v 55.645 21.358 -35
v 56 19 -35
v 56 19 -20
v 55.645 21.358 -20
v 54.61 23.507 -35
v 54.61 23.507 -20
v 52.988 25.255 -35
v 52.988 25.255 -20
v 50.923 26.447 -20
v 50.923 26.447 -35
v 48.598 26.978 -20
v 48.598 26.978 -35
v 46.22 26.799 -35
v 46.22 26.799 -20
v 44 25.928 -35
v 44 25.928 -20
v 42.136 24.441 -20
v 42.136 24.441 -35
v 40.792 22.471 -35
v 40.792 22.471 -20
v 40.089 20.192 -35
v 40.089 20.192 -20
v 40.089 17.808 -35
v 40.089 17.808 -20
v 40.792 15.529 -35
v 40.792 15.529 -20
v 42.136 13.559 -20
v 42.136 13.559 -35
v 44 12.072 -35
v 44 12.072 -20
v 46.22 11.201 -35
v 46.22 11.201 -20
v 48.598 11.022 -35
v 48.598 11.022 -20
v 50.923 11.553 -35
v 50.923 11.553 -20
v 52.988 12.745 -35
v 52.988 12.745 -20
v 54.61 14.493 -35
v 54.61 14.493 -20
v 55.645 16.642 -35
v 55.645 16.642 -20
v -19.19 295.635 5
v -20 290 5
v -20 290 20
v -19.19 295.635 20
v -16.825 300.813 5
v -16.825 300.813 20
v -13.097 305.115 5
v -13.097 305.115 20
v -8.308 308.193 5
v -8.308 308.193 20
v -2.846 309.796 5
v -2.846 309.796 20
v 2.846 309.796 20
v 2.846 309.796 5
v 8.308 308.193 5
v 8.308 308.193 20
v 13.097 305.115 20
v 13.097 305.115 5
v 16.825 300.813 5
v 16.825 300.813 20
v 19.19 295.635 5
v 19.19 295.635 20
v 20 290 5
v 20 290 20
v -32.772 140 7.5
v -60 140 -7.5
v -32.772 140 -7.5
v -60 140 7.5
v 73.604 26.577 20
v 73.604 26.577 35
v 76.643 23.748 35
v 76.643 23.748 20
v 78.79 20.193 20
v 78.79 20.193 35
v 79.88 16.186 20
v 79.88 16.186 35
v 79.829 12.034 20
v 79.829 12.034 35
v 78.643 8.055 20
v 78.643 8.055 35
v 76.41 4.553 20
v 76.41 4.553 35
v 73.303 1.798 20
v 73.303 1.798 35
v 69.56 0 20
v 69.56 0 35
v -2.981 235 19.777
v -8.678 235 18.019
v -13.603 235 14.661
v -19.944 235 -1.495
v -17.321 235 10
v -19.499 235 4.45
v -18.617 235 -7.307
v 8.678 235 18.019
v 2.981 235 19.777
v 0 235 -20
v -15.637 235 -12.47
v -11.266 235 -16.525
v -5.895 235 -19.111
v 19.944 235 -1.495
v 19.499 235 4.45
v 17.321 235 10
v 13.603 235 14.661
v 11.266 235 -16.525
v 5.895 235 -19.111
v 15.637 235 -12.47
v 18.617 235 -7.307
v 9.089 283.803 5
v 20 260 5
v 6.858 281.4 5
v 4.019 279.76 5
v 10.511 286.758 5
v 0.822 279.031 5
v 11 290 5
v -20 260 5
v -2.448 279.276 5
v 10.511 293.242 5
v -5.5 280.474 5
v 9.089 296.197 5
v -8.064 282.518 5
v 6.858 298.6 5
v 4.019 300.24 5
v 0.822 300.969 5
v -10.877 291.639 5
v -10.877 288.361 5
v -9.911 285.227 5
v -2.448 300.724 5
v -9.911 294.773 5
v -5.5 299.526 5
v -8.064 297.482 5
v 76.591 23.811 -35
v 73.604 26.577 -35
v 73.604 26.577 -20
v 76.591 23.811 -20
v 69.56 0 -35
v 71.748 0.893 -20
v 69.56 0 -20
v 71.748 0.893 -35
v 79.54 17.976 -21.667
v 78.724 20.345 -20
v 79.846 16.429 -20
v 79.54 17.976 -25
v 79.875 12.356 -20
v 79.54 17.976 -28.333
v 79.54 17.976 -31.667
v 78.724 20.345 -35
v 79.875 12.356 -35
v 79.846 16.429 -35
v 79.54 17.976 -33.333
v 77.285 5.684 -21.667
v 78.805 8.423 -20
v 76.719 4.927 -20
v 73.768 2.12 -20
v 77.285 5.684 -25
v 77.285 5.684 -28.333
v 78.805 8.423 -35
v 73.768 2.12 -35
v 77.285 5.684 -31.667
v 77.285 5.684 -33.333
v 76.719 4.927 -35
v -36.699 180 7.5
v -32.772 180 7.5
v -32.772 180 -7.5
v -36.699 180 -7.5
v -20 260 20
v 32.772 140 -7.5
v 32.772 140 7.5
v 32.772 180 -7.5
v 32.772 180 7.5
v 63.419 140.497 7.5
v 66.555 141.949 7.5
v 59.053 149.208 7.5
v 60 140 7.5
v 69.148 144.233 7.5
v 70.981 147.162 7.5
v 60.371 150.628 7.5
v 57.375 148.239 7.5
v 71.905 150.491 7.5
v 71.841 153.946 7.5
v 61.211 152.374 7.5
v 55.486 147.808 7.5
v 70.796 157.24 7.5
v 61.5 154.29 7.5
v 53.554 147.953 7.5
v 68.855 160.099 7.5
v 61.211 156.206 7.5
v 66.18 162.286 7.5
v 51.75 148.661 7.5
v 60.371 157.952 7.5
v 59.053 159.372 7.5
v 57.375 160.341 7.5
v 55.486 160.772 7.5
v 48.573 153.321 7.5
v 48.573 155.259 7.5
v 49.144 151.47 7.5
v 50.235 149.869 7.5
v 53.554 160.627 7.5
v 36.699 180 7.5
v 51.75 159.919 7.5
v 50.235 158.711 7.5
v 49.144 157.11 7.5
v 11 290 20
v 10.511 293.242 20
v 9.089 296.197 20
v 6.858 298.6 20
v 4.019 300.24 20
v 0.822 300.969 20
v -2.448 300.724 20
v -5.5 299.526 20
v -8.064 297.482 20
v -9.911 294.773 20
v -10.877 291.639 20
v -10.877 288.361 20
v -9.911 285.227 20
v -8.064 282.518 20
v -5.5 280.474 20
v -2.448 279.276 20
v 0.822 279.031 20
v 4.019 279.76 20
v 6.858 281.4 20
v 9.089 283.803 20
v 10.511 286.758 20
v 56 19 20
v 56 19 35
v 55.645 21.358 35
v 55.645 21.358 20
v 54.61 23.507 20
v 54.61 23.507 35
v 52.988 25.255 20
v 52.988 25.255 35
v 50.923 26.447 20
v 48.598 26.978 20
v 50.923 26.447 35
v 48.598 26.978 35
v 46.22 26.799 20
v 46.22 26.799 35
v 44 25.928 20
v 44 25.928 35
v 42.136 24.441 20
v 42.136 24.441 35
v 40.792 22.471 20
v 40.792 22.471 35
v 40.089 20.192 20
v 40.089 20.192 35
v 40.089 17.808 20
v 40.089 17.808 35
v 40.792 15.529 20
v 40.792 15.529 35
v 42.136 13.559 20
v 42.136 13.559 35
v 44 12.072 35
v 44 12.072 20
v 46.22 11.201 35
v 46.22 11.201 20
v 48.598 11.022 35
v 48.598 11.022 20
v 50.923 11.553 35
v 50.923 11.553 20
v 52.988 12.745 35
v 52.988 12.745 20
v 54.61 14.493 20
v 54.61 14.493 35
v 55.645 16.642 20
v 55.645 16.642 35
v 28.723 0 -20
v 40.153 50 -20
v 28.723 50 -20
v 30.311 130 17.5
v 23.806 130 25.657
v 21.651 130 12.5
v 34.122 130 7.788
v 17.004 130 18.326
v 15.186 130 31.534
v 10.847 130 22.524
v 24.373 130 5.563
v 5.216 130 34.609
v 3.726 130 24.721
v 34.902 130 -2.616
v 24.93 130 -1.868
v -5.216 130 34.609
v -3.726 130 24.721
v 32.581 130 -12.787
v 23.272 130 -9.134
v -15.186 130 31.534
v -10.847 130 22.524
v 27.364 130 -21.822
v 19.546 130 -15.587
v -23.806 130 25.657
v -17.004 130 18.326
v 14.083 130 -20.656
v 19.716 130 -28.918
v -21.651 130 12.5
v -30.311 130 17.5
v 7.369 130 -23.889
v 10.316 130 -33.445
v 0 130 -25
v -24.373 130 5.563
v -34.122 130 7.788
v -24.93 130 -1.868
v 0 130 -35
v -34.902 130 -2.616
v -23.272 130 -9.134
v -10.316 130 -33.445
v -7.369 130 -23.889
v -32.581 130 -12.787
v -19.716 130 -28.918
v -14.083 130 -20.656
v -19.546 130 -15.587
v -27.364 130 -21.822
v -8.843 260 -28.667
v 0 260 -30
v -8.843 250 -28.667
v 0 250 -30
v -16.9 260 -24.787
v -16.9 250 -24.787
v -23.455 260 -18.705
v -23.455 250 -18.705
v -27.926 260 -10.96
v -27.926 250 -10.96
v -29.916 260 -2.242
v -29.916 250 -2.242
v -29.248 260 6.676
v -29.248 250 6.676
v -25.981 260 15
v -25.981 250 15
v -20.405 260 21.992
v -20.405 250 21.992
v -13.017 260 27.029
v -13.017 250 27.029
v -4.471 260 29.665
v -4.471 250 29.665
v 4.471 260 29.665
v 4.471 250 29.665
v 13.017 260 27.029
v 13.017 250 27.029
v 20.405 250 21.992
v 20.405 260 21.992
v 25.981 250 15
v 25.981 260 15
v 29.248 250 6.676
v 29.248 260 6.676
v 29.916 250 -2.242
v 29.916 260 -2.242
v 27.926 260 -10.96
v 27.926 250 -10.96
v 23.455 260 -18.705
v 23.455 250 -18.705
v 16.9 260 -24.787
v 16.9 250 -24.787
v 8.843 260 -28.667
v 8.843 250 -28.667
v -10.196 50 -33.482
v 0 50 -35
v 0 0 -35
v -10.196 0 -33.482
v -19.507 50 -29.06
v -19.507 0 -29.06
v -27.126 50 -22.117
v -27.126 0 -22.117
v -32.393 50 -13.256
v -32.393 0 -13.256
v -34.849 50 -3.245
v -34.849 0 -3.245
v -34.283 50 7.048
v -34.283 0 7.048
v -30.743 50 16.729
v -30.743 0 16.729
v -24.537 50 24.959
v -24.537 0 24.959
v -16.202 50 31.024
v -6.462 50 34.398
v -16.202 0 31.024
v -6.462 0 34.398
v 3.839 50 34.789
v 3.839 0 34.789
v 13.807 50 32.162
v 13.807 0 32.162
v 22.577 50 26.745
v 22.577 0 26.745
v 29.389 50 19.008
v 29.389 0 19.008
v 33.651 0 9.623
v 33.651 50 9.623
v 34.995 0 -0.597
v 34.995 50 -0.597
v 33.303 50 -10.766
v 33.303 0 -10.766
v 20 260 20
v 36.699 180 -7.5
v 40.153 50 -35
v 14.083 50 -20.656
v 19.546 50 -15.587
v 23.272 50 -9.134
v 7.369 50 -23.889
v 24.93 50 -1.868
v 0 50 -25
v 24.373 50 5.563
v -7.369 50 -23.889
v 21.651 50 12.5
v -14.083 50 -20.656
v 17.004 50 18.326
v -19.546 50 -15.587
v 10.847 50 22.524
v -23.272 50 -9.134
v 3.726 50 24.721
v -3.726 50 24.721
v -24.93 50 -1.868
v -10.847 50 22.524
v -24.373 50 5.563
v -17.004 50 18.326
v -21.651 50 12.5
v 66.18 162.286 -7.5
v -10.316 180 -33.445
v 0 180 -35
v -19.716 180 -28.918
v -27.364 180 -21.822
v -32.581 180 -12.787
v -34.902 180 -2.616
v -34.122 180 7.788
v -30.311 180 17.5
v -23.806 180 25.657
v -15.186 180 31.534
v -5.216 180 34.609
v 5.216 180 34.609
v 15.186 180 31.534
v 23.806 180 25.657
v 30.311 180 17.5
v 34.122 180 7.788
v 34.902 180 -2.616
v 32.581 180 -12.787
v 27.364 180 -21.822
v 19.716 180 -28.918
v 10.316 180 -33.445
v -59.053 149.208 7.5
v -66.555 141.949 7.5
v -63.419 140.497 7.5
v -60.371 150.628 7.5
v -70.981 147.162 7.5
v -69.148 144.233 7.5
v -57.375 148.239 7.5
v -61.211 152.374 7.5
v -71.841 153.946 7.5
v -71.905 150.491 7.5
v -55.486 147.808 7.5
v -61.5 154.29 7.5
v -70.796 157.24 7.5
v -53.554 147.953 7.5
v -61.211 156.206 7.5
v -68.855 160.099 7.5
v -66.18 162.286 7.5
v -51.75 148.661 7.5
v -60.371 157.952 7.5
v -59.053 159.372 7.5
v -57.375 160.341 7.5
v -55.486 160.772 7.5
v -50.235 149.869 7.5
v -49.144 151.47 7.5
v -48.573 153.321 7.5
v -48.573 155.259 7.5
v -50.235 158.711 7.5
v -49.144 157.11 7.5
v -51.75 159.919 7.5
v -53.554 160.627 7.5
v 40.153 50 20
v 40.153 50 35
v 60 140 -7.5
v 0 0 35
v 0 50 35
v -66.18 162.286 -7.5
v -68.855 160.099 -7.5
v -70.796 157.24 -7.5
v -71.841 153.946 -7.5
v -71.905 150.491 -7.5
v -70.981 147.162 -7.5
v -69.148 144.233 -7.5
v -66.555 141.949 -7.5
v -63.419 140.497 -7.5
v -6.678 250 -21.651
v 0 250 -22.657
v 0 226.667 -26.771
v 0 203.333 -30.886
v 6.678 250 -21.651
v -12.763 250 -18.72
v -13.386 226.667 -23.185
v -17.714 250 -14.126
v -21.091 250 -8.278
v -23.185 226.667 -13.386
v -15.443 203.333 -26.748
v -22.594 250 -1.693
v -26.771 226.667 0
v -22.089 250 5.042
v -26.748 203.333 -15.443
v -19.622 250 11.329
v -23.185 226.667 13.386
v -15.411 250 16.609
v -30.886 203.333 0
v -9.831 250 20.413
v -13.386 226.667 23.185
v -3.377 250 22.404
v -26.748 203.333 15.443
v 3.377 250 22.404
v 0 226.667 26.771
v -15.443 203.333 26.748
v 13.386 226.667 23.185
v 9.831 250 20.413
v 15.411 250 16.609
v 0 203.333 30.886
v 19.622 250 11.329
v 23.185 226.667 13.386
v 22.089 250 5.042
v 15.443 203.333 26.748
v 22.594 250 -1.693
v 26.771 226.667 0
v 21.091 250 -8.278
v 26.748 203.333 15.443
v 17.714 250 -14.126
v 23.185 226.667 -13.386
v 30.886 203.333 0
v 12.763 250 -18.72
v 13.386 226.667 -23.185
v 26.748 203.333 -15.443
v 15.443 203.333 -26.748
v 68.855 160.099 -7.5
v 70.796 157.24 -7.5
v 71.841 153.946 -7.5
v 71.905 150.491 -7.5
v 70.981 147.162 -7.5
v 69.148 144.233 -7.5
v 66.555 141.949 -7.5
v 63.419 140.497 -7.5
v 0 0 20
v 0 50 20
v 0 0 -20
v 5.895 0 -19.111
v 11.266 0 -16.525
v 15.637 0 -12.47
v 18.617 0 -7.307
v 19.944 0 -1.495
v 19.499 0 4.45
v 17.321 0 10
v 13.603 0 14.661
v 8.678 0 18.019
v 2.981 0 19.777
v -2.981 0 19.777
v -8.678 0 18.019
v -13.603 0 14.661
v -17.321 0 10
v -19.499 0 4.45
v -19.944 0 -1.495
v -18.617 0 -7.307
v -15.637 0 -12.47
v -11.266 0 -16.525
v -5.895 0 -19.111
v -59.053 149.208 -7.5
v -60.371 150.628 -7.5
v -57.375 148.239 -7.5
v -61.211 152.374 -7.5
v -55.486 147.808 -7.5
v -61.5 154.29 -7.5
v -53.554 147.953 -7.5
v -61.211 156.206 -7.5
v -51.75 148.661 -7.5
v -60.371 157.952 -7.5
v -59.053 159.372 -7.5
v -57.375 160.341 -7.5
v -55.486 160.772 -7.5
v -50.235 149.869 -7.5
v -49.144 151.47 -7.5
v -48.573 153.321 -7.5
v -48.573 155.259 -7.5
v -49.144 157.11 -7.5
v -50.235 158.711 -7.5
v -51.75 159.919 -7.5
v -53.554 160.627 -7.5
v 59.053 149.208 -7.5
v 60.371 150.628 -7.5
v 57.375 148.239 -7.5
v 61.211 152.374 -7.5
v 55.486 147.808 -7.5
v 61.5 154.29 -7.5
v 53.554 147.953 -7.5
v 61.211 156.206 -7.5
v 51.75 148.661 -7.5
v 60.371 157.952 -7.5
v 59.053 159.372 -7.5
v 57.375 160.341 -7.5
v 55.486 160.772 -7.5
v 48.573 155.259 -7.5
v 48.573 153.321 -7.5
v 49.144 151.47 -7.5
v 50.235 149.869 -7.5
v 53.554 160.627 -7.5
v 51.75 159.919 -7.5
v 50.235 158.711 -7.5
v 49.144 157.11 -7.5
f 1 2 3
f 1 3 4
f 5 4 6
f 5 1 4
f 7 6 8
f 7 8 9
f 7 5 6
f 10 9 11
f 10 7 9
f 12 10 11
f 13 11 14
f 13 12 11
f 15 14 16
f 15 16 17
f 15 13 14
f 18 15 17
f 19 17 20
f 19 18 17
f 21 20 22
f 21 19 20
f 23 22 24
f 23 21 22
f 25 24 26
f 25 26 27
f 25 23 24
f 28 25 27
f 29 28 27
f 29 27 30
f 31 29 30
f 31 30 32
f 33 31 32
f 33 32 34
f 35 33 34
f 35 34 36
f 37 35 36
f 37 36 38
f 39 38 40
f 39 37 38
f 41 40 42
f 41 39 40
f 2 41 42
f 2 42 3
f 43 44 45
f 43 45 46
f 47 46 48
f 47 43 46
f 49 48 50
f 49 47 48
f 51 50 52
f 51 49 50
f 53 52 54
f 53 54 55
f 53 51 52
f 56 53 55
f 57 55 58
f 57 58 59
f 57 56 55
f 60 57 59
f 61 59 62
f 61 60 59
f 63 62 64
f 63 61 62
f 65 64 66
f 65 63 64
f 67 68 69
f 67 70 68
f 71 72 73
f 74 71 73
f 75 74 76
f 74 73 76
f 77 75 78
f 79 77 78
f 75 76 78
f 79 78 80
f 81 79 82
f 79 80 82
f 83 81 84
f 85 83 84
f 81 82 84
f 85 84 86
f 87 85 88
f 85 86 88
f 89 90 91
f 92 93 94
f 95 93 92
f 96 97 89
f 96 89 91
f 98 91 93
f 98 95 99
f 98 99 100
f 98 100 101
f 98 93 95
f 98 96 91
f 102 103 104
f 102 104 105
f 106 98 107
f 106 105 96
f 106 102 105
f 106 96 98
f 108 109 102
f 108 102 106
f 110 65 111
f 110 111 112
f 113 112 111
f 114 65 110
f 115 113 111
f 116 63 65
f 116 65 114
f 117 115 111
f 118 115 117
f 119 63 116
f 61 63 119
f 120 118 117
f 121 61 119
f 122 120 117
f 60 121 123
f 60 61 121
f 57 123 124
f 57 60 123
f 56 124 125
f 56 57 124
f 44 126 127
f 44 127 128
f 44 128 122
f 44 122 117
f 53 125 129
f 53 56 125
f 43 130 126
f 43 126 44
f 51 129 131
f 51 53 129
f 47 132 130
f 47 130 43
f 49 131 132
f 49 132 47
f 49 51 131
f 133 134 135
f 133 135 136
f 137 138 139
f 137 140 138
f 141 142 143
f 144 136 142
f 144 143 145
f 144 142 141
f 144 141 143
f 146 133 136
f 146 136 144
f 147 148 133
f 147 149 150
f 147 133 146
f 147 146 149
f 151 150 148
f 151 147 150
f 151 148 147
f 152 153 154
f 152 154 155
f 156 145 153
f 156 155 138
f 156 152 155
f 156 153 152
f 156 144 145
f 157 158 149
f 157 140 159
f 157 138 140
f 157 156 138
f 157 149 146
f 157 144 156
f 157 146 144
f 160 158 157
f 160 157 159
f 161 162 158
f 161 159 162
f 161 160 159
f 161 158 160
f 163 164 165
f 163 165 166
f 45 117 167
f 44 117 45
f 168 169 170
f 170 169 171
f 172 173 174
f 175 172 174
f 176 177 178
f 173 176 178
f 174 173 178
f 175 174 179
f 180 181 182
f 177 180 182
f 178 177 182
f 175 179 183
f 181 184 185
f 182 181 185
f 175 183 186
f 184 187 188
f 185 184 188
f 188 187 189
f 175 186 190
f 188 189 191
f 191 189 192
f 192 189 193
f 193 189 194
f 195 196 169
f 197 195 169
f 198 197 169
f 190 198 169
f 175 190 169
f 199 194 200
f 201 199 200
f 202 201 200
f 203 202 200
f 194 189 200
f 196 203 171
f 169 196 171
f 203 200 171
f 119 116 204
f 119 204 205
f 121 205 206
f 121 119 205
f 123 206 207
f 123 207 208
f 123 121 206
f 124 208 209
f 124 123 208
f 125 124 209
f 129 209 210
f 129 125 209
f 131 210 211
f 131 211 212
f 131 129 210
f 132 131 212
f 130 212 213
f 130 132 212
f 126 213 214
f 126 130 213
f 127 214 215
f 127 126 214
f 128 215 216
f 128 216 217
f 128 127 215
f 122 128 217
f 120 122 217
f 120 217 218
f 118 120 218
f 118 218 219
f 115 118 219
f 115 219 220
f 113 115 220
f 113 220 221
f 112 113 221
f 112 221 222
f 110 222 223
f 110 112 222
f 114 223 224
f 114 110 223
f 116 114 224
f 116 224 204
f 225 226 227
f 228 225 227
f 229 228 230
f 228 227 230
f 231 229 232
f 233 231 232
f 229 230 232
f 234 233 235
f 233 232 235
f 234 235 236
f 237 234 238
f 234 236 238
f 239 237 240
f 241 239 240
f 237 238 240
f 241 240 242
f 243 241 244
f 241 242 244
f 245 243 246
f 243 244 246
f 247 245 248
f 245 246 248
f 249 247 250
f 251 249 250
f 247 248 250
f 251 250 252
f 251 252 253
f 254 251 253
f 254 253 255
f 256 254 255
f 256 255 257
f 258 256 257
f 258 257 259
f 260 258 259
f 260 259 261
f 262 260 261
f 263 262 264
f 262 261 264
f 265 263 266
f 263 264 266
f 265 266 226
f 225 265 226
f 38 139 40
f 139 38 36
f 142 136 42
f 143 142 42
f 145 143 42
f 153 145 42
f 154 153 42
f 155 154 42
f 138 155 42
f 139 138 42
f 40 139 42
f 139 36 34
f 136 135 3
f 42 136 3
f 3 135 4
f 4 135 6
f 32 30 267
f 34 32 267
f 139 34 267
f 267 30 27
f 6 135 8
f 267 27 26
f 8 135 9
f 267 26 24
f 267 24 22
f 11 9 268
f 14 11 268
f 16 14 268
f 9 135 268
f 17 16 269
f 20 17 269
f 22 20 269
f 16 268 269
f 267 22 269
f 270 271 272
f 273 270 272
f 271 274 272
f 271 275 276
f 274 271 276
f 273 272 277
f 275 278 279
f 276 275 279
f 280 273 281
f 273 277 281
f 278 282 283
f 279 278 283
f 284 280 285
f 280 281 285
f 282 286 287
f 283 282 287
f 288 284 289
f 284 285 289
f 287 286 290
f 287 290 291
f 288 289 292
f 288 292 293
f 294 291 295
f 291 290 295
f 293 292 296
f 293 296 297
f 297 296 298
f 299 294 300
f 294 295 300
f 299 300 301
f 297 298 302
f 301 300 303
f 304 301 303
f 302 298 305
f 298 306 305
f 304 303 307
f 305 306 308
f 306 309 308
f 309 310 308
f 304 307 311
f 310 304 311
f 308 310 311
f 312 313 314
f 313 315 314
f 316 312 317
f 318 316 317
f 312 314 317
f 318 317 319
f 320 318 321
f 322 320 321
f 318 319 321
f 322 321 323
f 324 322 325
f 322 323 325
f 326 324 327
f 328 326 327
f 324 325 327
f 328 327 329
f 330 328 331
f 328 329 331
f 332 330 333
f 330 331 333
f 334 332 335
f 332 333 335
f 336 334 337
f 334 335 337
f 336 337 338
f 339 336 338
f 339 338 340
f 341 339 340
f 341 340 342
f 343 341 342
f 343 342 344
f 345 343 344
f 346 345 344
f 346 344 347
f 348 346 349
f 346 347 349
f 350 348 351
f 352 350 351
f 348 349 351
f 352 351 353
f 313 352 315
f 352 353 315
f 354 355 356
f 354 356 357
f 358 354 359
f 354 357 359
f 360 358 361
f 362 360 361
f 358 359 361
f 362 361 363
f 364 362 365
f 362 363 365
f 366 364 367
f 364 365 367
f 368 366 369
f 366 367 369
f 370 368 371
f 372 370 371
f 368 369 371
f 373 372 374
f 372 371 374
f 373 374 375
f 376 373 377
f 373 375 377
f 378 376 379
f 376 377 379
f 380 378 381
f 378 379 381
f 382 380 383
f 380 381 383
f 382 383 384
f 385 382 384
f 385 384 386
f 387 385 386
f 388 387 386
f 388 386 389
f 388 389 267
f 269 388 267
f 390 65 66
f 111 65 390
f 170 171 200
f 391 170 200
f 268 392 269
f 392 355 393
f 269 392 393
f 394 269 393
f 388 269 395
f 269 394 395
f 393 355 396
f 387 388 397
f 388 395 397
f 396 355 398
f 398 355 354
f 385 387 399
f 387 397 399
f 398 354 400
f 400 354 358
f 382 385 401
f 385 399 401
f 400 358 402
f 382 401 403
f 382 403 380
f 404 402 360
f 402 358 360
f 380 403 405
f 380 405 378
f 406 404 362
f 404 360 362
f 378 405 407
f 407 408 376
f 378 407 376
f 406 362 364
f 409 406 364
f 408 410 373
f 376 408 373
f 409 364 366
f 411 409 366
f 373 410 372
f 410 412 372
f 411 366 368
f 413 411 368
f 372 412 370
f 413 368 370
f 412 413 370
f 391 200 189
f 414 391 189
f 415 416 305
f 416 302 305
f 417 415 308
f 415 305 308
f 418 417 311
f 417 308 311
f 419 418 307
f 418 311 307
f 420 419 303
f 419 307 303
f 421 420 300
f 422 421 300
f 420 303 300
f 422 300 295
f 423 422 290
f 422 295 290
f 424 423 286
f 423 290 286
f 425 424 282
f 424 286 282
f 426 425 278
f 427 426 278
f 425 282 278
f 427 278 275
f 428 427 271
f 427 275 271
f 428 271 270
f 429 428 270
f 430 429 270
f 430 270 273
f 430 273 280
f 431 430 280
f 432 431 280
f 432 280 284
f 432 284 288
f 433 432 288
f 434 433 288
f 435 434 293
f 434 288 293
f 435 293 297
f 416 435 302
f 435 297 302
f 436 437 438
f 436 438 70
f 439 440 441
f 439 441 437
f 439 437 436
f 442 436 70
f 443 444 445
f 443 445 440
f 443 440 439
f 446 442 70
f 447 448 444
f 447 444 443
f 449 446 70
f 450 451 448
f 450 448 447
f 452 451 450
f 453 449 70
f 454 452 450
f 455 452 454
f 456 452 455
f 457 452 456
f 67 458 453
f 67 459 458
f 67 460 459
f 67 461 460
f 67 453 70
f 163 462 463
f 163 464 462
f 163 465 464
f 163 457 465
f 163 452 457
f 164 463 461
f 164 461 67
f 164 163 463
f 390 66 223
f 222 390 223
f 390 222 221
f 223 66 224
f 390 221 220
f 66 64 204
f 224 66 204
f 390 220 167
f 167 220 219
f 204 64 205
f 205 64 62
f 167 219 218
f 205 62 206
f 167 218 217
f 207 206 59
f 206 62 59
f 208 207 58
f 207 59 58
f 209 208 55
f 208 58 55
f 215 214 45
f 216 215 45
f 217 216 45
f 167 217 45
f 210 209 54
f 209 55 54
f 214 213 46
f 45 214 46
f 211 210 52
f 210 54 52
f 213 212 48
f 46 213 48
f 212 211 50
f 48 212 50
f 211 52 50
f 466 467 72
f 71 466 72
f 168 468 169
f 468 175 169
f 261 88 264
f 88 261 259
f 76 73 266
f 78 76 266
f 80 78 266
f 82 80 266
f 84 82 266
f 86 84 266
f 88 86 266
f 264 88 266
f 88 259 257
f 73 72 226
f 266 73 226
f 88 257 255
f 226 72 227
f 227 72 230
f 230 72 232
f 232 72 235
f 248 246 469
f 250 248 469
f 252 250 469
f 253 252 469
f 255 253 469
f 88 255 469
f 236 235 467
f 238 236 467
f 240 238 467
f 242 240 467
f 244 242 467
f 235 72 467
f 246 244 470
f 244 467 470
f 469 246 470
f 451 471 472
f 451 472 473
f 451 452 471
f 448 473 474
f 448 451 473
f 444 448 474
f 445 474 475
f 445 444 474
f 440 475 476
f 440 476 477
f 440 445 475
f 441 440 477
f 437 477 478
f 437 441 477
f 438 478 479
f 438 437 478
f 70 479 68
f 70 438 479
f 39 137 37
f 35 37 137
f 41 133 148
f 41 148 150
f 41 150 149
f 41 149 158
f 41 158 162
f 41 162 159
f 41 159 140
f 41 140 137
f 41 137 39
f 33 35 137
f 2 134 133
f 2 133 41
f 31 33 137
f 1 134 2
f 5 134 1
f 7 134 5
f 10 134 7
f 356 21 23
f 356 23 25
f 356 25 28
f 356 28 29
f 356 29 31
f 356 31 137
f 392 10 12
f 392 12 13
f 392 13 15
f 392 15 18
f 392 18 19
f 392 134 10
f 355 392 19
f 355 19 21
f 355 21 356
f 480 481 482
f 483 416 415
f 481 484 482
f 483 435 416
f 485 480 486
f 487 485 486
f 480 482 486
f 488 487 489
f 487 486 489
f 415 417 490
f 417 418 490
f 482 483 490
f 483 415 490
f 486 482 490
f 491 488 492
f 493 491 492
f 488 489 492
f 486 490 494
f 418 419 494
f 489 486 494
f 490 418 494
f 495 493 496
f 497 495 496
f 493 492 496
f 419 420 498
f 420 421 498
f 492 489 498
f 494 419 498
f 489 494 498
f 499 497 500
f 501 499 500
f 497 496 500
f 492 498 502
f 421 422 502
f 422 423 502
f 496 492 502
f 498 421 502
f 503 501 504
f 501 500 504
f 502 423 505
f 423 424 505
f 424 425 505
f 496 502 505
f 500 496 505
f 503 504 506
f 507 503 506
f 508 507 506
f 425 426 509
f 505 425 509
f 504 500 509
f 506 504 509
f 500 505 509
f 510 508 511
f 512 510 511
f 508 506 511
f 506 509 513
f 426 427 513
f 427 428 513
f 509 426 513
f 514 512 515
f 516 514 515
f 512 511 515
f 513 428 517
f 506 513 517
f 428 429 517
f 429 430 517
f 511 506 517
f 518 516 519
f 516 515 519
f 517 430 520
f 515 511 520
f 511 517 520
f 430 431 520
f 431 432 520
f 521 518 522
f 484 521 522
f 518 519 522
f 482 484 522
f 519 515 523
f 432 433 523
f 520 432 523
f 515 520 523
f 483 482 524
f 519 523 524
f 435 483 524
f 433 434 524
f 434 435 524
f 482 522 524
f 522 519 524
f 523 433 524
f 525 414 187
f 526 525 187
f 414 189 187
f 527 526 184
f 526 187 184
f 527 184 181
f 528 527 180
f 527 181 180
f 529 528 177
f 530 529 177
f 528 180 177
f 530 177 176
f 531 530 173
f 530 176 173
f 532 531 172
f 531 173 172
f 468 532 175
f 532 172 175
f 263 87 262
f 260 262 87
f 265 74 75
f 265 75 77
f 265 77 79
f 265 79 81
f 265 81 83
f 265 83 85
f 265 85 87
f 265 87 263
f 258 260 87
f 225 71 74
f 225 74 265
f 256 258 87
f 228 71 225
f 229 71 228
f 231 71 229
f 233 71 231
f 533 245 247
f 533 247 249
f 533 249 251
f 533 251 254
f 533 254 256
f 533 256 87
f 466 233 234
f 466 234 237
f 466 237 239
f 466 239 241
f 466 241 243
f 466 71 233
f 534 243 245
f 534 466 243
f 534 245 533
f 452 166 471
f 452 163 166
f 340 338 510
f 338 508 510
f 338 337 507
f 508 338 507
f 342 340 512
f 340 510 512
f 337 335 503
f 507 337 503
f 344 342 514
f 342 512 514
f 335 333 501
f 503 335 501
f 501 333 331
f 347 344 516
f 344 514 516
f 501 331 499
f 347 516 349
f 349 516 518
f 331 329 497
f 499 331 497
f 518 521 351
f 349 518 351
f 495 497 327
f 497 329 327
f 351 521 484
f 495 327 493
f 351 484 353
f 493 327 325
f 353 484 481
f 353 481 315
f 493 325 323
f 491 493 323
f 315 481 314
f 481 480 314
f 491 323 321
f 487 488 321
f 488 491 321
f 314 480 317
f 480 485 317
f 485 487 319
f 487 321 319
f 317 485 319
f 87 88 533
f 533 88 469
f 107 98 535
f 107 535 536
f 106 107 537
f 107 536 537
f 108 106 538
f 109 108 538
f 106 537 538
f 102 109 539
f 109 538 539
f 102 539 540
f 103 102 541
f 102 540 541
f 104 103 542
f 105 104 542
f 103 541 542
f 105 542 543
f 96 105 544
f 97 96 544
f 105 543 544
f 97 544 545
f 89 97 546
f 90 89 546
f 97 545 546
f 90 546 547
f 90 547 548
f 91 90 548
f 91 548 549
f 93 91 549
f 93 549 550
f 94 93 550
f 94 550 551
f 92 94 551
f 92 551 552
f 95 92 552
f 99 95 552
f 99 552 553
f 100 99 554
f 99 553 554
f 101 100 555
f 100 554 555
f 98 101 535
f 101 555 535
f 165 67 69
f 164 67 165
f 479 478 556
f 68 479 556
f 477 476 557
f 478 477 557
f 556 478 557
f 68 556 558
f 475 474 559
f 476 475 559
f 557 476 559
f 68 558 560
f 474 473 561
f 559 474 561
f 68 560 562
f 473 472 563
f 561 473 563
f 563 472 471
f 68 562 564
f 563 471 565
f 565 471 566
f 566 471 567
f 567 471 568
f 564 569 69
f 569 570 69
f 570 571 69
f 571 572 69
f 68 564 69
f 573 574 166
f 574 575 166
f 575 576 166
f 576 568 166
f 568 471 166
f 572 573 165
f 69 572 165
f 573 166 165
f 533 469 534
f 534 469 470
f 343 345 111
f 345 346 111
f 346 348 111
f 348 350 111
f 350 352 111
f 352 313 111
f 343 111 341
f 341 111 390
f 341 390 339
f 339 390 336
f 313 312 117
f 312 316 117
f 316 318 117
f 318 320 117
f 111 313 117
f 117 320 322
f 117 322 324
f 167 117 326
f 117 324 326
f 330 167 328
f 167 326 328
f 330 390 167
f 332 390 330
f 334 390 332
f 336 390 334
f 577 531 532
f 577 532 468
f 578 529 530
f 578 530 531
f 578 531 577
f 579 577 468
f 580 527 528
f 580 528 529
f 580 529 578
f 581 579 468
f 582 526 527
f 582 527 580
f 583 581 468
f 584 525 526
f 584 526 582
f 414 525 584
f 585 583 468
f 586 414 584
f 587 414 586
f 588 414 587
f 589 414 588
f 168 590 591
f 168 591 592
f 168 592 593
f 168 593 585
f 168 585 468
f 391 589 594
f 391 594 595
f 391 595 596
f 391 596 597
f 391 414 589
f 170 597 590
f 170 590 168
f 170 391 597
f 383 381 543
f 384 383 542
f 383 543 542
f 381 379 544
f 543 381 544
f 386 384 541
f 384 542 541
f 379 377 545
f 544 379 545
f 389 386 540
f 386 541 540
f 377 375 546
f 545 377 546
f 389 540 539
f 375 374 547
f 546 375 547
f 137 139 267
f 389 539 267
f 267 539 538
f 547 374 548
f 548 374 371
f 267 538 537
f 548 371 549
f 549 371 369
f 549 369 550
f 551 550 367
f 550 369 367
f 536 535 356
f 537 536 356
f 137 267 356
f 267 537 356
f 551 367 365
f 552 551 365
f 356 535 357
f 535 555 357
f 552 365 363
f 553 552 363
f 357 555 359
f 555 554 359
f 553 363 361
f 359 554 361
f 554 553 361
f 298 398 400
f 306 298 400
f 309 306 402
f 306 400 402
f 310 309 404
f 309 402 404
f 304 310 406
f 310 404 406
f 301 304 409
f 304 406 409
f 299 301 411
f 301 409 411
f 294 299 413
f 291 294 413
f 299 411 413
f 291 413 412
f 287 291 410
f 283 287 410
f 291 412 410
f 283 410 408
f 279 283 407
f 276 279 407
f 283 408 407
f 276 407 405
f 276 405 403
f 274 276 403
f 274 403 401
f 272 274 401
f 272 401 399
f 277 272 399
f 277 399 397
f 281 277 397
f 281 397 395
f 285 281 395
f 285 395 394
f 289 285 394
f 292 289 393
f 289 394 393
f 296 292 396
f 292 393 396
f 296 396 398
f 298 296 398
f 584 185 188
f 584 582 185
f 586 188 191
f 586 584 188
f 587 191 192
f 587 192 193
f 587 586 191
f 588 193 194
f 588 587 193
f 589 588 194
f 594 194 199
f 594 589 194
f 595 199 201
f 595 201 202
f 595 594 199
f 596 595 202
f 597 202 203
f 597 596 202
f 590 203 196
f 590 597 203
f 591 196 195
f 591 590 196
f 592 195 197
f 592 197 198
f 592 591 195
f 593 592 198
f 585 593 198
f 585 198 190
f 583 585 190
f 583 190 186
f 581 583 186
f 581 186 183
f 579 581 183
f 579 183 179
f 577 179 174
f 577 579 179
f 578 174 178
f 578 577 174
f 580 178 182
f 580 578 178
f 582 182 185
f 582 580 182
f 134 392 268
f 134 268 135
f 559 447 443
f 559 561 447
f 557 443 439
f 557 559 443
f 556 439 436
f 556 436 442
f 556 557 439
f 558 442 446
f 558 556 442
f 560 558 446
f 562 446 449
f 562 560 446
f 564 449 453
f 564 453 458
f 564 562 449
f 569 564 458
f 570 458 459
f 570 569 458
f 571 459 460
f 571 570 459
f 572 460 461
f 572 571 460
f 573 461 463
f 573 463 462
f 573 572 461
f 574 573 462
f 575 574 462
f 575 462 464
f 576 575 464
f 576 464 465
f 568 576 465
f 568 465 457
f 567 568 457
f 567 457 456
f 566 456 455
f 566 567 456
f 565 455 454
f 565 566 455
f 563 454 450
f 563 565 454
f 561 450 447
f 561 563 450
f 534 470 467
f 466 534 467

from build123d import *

# Parameters (mm, degrees)
SKETCH4_R             = 11
BOSS_EXTRUDE2_DEPTH   = 15
SKETCH5_R             = 6.5
BOSS_EXTRUDE3_DEPTH   = 7.5
BOSS_EXTRUDE3_2_DEPTH = 7.5
SKETCH8_R             = 8
BOSS_EXTRUDE4_DEPTH   = 15
SKETCH10_R            = 8
BOSS_EXTRUDE5_DEPTH   = 15
SKETCH11_R            = 20
CUT_EXTRUDE1_DEPTH    = 235


with BuildPart() as part:
    # Sketch3 → Revolve1 (revolve)
    with BuildSketch(Plane.XY, mode=Mode.PRIVATE) as revolve1_sk:
        Polygon((0, 260), (30, 260), (30, 250), (22.65711135, 250), (35, 180), (35, 130), (25, 130), (25, 50), (35, 50), (35, 0), (0, 0), align=None)
    revolve(revolve1_sk.sketch.rotate(Axis((0, 0, 0), (0, 1, 0)), 90), axis=Axis((0, 0, 0), (0, 1, 0)))

    # Sketch4 → Boss-Extrude2 (add)
    with BuildSketch(Plane.XY.offset(5)):
        with BuildLine():
            Line((-20, 260), (-20, 290))
            ThreePointArc((-20, 290), (0, 310), (20, 290))
            Line((20, 290), (20, 260))
            Line((20, 260), (-20, 260))
        make_face()
        with Locations((0, 290)):
            Circle(SKETCH4_R, mode=Mode.SUBTRACT)
    extrude(amount=BOSS_EXTRUDE2_DEPTH)

    # Sketch10 → Boss-Extrude5 (add)
    with BuildSketch(Plane.XY.offset(-35)):
        with BuildLine():
            Line((0, 0), (0, 50))
            Line((0, 50), (40.152536614, 50))
            Line((40.152536614, 50), (73.603646545, 26.577280664))
            add(Edge.make_bspline(
                [(73.603646545, 26.577280664), (75.127065021, 25.513502774), (76.980437774, 23.612432373), (78.731268766, 20.505635824), (79.726147072, 17.725211617), (80.11166501, 14.631092772), (79.807327508, 11.24718434), (78.882377726, 8.303748645), (77.361059944, 5.651175507), (74.672672088, 2.458032167), (71.81463949, 0.712940429), (69.560252186, 0)],
                knots=[0, 0, 0, 0, 0.167351003, 0.234881855, 0.320469705, 0.432120269, 0.512918946, 0.625495349, 0.707152757, 0.787292149, 1, 1, 1, 1], degree=3))
            Line((69.560252186, 0), (0, 0))
        make_face()
        with Locations((48, 19)):
            Circle(SKETCH10_R, mode=Mode.SUBTRACT)
    extrude(amount=BOSS_EXTRUDE5_DEPTH)

    # Sketch11 → Cut-Extrude1 (cut)
    with BuildSketch(Plane.XZ):
        with Locations(Location((0, 0, 0), (0, 0, 270))):
            Circle(SKETCH11_R)
    extrude(amount=-CUT_EXTRUDE1_DEPTH, mode=Mode.SUBTRACT)


with BuildPart() as body_2:
    # Sketch5 → Boss-Extrude3 (new, symmetric)
    with BuildSketch(Plane.XY):
        with BuildLine():
            Line((35, 180), (36.699422811, 180))
            Line((36.699422811, 180), (66.180456899, 162.286007608))
            ThreePointArc((66.180456899, 162.286007608), (71.563565439, 148.793139487), (60, 140))
            Line((60, 140), (35, 140))
            Line((35, 140), (32.771840792, 140))
            Line((32.771840792, 140), (32.771840792, 180))
            Line((32.771840792, 180), (35, 180))
        make_face()
        with Locations((55, 154.29)):
            Circle(SKETCH5_R, mode=Mode.SUBTRACT)
    extrude(amount=BOSS_EXTRUDE3_DEPTH, both=True)


with BuildPart() as body_3:
    # Sketch5 → Boss-Extrude3 2 (new, symmetric)
    with BuildSketch(Plane.XY):
        with BuildLine():
            Line((-60, 140), (-35, 140))
            Line((-35, 140), (-32.771840792, 140))
            Line((-32.771840792, 140), (-32.771840792, 180))
            Line((-32.771840792, 180), (-35, 180))
            Line((-35, 180), (-36.699422811, 180))
            Line((-36.699422811, 180), (-66.180456899, 162.286007608))
            ThreePointArc((-66.180456899, 162.286007608), (-71.563565439, 148.793139487), (-60, 140))
        make_face()
        with Locations(Location((-55, 154.29, 0), (0, 0, 180))):
            Circle(SKETCH5_R, mode=Mode.SUBTRACT)
    extrude(amount=BOSS_EXTRUDE3_2_DEPTH, both=True)


with BuildPart() as body_4:
    # Sketch8 → Boss-Extrude4 (new body)
    with BuildSketch(Plane.XY.offset(35)):
        with BuildLine():
            Line((35, 50), (40.152536614, 50))
            Line((40.152536614, 50), (73.603646545, 26.577280664))
            ThreePointArc((73.603646545, 26.577280664), (79.829363416, 12.033901449), (69.560252186, 0))
            Line((69.560252186, 0), (35, 0))
            Line((35, 0), (0, 0))
            Line((0, 0), (0, 50))
            Line((0, 50), (35, 50))
        make_face()
        with Locations((48, 19)):
            Circle(SKETCH8_R, mode=Mode.SUBTRACT)
    extrude(amount=-BOSS_EXTRUDE4_DEPTH)


solid = Compound([part.part, body_2.part, body_3.part, body_4.part])
